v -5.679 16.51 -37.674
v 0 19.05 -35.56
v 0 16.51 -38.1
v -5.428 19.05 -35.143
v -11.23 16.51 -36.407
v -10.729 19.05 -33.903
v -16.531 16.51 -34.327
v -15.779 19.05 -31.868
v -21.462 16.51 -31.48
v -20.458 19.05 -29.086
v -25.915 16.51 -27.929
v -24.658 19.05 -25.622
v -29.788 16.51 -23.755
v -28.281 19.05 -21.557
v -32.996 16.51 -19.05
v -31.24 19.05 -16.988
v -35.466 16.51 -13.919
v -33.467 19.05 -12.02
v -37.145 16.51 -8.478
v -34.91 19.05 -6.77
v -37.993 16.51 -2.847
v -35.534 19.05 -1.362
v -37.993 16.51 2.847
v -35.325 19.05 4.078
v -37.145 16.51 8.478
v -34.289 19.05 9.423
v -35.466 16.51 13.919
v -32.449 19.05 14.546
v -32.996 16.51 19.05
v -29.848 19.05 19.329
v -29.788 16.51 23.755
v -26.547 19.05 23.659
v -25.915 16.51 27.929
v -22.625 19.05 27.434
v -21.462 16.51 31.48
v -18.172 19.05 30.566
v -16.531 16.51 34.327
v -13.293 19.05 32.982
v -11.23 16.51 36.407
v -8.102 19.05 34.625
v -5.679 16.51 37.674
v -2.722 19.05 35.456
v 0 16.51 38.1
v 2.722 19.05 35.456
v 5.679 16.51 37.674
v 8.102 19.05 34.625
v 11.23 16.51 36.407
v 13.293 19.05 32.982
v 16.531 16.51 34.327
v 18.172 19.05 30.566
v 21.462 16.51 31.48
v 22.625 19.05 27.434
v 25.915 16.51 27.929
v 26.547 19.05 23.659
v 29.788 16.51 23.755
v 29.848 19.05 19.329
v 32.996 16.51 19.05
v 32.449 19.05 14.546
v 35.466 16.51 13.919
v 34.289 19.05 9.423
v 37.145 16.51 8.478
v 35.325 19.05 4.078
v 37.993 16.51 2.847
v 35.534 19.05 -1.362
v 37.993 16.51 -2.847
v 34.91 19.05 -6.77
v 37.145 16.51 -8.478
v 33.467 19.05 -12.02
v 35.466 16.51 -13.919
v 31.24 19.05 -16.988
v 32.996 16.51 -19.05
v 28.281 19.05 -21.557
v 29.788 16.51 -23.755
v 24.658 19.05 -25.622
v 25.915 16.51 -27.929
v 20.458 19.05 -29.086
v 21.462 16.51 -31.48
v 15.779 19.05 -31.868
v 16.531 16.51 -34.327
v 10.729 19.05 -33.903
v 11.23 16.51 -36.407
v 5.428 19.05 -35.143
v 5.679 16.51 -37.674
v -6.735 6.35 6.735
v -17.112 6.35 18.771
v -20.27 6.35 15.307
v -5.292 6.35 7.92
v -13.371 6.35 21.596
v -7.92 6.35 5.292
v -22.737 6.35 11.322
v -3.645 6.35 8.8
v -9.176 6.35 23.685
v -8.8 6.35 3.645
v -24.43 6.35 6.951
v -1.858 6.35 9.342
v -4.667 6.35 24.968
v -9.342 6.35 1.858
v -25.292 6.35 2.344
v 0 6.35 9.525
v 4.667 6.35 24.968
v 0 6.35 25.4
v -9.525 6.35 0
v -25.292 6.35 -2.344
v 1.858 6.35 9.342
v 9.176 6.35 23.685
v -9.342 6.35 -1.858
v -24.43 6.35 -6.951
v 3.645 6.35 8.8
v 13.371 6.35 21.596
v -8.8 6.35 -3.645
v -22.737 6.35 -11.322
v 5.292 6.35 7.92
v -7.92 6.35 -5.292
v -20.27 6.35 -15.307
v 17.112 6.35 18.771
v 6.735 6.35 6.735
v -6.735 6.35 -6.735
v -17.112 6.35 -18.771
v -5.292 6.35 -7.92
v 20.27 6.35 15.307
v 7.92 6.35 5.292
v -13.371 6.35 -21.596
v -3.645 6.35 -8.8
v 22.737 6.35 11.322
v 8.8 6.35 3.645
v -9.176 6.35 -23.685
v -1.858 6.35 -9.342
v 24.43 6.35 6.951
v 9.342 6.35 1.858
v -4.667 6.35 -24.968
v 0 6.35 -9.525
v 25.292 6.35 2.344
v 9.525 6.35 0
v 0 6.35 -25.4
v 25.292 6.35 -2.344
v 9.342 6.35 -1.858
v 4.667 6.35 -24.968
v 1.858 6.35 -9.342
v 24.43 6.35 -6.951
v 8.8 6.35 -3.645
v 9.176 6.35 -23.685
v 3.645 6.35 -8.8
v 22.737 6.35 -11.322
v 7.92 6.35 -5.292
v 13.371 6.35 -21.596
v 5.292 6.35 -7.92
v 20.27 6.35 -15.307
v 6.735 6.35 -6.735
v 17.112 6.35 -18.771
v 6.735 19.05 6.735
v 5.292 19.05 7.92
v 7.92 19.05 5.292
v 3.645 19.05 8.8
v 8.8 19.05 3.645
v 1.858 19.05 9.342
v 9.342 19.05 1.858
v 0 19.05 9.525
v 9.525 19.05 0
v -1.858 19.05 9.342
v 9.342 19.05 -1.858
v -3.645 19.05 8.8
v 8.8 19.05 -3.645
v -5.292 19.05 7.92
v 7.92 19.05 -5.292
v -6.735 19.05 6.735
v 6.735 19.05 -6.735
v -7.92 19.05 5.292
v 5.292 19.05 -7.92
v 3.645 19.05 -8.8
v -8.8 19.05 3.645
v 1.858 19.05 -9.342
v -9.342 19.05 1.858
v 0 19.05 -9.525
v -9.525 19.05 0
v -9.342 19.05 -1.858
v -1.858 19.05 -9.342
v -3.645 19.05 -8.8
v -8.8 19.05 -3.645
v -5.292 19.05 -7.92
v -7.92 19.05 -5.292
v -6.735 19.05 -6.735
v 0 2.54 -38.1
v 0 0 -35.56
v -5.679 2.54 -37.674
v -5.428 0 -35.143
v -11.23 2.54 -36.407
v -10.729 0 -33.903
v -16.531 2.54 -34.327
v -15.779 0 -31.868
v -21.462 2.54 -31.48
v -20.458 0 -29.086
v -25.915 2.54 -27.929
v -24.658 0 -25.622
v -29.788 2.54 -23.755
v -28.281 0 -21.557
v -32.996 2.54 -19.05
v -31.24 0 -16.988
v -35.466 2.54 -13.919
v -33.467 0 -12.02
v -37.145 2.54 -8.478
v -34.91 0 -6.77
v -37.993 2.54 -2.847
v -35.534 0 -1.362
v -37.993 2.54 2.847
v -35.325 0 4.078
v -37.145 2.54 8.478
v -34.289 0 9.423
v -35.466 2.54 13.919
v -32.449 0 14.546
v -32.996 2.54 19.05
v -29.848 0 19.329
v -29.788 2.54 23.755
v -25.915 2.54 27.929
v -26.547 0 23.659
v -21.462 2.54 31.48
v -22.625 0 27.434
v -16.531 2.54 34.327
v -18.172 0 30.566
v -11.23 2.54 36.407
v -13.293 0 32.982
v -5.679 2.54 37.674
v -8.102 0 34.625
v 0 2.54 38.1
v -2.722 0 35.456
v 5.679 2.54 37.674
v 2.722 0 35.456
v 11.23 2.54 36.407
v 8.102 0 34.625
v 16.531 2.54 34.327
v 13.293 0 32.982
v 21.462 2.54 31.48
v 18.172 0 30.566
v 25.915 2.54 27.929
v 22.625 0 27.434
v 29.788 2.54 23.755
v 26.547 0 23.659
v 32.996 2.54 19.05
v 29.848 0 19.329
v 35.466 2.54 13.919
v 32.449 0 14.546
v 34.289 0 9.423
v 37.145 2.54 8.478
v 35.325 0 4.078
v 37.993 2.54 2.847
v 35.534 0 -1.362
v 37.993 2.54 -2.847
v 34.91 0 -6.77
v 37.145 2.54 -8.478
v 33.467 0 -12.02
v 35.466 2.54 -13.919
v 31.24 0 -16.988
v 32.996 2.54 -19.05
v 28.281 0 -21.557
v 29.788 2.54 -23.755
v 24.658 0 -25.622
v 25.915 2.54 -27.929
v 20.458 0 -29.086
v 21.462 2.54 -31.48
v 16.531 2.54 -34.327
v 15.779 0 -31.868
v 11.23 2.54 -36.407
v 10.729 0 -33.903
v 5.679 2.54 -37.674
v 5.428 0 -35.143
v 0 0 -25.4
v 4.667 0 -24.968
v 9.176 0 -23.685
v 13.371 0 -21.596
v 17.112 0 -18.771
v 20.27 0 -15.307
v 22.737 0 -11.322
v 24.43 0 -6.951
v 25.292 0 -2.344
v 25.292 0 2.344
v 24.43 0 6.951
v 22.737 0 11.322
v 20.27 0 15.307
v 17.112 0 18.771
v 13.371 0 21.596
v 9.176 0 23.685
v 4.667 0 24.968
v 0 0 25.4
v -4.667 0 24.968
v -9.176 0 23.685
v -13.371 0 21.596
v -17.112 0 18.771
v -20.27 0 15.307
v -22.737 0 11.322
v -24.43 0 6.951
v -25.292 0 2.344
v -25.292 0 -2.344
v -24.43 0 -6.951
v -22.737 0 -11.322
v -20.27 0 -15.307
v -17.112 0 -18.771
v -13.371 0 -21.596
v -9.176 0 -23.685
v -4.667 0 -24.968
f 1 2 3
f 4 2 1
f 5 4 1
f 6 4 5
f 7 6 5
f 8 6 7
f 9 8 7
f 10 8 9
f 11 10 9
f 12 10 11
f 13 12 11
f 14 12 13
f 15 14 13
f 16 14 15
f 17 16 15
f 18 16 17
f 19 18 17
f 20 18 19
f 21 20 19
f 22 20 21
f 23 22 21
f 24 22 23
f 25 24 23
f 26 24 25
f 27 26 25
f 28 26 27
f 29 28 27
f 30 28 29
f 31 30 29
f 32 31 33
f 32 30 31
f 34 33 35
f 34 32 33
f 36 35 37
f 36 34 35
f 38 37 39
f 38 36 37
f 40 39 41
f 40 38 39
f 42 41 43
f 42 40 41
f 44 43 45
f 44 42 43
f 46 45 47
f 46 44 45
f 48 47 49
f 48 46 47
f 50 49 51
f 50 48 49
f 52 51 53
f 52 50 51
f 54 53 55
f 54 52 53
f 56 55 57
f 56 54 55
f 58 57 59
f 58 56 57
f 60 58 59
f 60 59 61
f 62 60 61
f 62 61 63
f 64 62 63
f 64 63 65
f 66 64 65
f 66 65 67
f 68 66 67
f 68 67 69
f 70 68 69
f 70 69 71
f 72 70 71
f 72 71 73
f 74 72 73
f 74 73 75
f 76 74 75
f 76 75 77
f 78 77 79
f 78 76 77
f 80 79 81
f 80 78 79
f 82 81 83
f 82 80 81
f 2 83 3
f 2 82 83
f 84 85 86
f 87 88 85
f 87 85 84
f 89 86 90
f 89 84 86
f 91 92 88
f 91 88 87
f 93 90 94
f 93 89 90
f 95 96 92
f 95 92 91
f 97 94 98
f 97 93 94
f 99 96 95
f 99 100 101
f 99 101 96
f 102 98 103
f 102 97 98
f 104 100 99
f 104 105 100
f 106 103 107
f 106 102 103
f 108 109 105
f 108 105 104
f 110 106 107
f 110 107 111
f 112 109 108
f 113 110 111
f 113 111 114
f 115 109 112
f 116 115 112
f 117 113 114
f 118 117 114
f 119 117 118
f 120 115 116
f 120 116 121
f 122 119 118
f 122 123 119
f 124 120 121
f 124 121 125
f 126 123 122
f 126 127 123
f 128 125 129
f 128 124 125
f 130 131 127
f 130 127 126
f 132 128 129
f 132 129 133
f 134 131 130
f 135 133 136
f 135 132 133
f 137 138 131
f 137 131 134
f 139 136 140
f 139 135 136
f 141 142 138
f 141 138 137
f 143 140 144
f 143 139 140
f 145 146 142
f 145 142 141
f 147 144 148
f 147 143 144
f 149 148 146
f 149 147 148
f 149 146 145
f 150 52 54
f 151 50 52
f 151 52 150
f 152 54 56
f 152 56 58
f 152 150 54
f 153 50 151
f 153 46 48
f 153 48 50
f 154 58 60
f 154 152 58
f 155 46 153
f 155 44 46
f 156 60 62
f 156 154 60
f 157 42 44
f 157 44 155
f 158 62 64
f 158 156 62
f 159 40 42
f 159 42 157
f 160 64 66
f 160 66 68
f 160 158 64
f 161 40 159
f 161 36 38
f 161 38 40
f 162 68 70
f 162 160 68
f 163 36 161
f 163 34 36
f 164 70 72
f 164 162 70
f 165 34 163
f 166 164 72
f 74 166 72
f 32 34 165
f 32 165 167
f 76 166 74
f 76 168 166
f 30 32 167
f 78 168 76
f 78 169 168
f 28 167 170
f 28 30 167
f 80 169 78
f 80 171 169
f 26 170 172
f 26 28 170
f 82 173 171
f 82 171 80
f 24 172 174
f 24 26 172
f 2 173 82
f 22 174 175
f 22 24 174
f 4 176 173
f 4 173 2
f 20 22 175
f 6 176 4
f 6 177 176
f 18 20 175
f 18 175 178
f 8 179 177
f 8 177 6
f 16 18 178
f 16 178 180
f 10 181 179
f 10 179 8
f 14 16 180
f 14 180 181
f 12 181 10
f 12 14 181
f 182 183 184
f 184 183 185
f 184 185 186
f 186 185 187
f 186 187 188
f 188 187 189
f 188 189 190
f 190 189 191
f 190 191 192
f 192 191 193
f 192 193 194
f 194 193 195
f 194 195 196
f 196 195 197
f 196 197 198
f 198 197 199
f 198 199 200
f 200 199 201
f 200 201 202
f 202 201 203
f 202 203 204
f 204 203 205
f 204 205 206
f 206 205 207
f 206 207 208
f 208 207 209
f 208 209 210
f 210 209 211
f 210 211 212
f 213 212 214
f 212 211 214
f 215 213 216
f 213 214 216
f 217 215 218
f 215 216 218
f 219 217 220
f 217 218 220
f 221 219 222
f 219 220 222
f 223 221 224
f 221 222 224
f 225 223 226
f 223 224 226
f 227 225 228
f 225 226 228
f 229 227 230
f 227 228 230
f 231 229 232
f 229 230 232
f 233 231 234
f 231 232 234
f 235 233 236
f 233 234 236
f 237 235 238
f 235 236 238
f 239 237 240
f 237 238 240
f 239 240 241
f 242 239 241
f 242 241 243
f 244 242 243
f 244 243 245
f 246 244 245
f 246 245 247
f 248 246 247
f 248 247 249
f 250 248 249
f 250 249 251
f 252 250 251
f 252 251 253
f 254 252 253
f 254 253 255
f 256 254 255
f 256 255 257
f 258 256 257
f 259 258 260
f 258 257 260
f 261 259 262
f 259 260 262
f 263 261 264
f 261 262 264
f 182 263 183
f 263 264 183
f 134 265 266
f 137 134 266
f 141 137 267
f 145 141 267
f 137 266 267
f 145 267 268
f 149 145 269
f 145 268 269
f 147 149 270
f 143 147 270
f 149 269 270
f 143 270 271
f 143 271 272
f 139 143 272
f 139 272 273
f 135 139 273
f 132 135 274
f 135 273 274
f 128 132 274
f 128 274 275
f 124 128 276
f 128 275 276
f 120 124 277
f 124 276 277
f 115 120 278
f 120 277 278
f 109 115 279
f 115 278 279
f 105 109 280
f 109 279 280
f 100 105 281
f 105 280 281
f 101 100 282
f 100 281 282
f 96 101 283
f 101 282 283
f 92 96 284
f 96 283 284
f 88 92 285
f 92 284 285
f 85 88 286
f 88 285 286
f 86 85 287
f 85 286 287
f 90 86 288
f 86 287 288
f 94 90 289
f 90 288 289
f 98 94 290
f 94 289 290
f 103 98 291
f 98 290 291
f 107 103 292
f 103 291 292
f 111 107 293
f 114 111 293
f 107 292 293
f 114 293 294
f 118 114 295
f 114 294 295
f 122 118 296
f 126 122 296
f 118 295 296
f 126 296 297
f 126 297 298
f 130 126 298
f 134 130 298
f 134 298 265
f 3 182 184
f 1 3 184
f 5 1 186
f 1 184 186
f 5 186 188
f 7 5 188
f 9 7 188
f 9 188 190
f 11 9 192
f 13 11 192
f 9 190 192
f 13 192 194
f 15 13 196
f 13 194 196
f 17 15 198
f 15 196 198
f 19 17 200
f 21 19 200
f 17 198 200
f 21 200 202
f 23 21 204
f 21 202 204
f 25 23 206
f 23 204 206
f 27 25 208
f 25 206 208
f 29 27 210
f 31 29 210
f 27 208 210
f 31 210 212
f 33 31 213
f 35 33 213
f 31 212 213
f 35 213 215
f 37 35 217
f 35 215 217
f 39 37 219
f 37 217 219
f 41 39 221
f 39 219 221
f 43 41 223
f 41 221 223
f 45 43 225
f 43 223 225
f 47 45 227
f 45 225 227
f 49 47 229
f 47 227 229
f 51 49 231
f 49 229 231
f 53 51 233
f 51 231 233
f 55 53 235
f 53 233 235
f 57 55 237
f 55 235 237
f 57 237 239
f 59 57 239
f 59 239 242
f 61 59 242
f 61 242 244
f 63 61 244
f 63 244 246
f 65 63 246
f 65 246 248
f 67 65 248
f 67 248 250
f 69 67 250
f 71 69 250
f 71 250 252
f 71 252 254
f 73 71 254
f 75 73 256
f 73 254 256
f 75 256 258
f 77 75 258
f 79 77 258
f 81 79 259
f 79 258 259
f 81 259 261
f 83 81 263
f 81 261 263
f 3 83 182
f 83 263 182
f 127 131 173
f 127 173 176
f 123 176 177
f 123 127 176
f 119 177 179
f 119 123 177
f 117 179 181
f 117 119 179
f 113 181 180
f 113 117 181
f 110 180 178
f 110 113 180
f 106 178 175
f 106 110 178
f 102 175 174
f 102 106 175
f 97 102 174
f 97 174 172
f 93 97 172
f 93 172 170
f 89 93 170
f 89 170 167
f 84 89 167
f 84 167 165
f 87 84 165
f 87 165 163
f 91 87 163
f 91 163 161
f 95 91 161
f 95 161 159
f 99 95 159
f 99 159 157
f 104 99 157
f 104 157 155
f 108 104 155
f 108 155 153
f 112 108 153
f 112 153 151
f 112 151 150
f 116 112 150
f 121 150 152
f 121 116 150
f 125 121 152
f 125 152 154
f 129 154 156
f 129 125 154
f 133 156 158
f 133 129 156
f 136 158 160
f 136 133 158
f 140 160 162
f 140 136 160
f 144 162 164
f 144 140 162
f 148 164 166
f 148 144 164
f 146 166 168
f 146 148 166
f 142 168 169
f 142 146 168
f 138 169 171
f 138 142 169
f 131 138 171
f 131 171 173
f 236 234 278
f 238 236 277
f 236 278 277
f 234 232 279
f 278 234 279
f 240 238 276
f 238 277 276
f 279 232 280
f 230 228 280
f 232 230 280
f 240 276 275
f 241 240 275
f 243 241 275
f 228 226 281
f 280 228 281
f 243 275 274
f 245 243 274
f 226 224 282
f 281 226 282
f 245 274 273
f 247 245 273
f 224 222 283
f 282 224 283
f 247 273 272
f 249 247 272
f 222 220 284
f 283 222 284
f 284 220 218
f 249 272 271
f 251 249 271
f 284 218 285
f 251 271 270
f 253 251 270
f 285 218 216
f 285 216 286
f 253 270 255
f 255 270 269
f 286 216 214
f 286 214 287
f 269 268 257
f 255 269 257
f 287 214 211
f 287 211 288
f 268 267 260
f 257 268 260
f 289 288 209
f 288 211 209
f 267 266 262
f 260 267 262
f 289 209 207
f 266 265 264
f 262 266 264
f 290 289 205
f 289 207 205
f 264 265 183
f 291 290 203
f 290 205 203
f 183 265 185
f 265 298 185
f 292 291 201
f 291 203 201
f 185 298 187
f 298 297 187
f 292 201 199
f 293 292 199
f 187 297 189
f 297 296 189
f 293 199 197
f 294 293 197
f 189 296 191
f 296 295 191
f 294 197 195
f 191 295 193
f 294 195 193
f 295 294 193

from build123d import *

# Parameters (mm, degrees)
SKETCH1_R           = 38.1
SKETCH1_R_2         = 9.525
BOSS_EXTRUDE1_DEPTH = 19.05
CHAMFER1_SIZE       = 2.54
SKETCH3_R           = 25.4
CUT_EXTRUDE2_DEPTH  = 6.35


with BuildPart() as part:
    # Sketch1 → Boss-Extrude1 (new body)
    with BuildSketch(Plane(origin=(0, 0, 0), x_dir=(1, 0, 0), z_dir=(0, 1, 0))):
        with Locations(Location((0, 0, 0), (0, 0, 90))):
            Circle(SKETCH1_R)
        with Locations(Location((0, 0, 0), (0, 0, 90))):
            Circle(SKETCH1_R_2, mode=Mode.SUBTRACT)
    extrude(amount=BOSS_EXTRUDE1_DEPTH)

    # Chamfer1
    chamfer1_edges = [part.edges().sort_by_distance(p)[0] for p in [
        (0, 0, 38.1),
        (0, 19.05, 38.1),
    ]]
    chamfer(chamfer1_edges, length=CHAMFER1_SIZE)

    # Sketch3 → Cut-Extrude2 (cut)
    with BuildSketch(Plane(origin=(0, 0, 0), x_dir=(-1, 0, 0), z_dir=(0, -1, 0))):
        with Locations(Location((0, 0, 0), (0, 0, 90))):
            Circle(SKETCH3_R)
    extrude(amount=-CUT_EXTRUDE2_DEPTH, mode=Mode.SUBTRACT)


solid = part.part
